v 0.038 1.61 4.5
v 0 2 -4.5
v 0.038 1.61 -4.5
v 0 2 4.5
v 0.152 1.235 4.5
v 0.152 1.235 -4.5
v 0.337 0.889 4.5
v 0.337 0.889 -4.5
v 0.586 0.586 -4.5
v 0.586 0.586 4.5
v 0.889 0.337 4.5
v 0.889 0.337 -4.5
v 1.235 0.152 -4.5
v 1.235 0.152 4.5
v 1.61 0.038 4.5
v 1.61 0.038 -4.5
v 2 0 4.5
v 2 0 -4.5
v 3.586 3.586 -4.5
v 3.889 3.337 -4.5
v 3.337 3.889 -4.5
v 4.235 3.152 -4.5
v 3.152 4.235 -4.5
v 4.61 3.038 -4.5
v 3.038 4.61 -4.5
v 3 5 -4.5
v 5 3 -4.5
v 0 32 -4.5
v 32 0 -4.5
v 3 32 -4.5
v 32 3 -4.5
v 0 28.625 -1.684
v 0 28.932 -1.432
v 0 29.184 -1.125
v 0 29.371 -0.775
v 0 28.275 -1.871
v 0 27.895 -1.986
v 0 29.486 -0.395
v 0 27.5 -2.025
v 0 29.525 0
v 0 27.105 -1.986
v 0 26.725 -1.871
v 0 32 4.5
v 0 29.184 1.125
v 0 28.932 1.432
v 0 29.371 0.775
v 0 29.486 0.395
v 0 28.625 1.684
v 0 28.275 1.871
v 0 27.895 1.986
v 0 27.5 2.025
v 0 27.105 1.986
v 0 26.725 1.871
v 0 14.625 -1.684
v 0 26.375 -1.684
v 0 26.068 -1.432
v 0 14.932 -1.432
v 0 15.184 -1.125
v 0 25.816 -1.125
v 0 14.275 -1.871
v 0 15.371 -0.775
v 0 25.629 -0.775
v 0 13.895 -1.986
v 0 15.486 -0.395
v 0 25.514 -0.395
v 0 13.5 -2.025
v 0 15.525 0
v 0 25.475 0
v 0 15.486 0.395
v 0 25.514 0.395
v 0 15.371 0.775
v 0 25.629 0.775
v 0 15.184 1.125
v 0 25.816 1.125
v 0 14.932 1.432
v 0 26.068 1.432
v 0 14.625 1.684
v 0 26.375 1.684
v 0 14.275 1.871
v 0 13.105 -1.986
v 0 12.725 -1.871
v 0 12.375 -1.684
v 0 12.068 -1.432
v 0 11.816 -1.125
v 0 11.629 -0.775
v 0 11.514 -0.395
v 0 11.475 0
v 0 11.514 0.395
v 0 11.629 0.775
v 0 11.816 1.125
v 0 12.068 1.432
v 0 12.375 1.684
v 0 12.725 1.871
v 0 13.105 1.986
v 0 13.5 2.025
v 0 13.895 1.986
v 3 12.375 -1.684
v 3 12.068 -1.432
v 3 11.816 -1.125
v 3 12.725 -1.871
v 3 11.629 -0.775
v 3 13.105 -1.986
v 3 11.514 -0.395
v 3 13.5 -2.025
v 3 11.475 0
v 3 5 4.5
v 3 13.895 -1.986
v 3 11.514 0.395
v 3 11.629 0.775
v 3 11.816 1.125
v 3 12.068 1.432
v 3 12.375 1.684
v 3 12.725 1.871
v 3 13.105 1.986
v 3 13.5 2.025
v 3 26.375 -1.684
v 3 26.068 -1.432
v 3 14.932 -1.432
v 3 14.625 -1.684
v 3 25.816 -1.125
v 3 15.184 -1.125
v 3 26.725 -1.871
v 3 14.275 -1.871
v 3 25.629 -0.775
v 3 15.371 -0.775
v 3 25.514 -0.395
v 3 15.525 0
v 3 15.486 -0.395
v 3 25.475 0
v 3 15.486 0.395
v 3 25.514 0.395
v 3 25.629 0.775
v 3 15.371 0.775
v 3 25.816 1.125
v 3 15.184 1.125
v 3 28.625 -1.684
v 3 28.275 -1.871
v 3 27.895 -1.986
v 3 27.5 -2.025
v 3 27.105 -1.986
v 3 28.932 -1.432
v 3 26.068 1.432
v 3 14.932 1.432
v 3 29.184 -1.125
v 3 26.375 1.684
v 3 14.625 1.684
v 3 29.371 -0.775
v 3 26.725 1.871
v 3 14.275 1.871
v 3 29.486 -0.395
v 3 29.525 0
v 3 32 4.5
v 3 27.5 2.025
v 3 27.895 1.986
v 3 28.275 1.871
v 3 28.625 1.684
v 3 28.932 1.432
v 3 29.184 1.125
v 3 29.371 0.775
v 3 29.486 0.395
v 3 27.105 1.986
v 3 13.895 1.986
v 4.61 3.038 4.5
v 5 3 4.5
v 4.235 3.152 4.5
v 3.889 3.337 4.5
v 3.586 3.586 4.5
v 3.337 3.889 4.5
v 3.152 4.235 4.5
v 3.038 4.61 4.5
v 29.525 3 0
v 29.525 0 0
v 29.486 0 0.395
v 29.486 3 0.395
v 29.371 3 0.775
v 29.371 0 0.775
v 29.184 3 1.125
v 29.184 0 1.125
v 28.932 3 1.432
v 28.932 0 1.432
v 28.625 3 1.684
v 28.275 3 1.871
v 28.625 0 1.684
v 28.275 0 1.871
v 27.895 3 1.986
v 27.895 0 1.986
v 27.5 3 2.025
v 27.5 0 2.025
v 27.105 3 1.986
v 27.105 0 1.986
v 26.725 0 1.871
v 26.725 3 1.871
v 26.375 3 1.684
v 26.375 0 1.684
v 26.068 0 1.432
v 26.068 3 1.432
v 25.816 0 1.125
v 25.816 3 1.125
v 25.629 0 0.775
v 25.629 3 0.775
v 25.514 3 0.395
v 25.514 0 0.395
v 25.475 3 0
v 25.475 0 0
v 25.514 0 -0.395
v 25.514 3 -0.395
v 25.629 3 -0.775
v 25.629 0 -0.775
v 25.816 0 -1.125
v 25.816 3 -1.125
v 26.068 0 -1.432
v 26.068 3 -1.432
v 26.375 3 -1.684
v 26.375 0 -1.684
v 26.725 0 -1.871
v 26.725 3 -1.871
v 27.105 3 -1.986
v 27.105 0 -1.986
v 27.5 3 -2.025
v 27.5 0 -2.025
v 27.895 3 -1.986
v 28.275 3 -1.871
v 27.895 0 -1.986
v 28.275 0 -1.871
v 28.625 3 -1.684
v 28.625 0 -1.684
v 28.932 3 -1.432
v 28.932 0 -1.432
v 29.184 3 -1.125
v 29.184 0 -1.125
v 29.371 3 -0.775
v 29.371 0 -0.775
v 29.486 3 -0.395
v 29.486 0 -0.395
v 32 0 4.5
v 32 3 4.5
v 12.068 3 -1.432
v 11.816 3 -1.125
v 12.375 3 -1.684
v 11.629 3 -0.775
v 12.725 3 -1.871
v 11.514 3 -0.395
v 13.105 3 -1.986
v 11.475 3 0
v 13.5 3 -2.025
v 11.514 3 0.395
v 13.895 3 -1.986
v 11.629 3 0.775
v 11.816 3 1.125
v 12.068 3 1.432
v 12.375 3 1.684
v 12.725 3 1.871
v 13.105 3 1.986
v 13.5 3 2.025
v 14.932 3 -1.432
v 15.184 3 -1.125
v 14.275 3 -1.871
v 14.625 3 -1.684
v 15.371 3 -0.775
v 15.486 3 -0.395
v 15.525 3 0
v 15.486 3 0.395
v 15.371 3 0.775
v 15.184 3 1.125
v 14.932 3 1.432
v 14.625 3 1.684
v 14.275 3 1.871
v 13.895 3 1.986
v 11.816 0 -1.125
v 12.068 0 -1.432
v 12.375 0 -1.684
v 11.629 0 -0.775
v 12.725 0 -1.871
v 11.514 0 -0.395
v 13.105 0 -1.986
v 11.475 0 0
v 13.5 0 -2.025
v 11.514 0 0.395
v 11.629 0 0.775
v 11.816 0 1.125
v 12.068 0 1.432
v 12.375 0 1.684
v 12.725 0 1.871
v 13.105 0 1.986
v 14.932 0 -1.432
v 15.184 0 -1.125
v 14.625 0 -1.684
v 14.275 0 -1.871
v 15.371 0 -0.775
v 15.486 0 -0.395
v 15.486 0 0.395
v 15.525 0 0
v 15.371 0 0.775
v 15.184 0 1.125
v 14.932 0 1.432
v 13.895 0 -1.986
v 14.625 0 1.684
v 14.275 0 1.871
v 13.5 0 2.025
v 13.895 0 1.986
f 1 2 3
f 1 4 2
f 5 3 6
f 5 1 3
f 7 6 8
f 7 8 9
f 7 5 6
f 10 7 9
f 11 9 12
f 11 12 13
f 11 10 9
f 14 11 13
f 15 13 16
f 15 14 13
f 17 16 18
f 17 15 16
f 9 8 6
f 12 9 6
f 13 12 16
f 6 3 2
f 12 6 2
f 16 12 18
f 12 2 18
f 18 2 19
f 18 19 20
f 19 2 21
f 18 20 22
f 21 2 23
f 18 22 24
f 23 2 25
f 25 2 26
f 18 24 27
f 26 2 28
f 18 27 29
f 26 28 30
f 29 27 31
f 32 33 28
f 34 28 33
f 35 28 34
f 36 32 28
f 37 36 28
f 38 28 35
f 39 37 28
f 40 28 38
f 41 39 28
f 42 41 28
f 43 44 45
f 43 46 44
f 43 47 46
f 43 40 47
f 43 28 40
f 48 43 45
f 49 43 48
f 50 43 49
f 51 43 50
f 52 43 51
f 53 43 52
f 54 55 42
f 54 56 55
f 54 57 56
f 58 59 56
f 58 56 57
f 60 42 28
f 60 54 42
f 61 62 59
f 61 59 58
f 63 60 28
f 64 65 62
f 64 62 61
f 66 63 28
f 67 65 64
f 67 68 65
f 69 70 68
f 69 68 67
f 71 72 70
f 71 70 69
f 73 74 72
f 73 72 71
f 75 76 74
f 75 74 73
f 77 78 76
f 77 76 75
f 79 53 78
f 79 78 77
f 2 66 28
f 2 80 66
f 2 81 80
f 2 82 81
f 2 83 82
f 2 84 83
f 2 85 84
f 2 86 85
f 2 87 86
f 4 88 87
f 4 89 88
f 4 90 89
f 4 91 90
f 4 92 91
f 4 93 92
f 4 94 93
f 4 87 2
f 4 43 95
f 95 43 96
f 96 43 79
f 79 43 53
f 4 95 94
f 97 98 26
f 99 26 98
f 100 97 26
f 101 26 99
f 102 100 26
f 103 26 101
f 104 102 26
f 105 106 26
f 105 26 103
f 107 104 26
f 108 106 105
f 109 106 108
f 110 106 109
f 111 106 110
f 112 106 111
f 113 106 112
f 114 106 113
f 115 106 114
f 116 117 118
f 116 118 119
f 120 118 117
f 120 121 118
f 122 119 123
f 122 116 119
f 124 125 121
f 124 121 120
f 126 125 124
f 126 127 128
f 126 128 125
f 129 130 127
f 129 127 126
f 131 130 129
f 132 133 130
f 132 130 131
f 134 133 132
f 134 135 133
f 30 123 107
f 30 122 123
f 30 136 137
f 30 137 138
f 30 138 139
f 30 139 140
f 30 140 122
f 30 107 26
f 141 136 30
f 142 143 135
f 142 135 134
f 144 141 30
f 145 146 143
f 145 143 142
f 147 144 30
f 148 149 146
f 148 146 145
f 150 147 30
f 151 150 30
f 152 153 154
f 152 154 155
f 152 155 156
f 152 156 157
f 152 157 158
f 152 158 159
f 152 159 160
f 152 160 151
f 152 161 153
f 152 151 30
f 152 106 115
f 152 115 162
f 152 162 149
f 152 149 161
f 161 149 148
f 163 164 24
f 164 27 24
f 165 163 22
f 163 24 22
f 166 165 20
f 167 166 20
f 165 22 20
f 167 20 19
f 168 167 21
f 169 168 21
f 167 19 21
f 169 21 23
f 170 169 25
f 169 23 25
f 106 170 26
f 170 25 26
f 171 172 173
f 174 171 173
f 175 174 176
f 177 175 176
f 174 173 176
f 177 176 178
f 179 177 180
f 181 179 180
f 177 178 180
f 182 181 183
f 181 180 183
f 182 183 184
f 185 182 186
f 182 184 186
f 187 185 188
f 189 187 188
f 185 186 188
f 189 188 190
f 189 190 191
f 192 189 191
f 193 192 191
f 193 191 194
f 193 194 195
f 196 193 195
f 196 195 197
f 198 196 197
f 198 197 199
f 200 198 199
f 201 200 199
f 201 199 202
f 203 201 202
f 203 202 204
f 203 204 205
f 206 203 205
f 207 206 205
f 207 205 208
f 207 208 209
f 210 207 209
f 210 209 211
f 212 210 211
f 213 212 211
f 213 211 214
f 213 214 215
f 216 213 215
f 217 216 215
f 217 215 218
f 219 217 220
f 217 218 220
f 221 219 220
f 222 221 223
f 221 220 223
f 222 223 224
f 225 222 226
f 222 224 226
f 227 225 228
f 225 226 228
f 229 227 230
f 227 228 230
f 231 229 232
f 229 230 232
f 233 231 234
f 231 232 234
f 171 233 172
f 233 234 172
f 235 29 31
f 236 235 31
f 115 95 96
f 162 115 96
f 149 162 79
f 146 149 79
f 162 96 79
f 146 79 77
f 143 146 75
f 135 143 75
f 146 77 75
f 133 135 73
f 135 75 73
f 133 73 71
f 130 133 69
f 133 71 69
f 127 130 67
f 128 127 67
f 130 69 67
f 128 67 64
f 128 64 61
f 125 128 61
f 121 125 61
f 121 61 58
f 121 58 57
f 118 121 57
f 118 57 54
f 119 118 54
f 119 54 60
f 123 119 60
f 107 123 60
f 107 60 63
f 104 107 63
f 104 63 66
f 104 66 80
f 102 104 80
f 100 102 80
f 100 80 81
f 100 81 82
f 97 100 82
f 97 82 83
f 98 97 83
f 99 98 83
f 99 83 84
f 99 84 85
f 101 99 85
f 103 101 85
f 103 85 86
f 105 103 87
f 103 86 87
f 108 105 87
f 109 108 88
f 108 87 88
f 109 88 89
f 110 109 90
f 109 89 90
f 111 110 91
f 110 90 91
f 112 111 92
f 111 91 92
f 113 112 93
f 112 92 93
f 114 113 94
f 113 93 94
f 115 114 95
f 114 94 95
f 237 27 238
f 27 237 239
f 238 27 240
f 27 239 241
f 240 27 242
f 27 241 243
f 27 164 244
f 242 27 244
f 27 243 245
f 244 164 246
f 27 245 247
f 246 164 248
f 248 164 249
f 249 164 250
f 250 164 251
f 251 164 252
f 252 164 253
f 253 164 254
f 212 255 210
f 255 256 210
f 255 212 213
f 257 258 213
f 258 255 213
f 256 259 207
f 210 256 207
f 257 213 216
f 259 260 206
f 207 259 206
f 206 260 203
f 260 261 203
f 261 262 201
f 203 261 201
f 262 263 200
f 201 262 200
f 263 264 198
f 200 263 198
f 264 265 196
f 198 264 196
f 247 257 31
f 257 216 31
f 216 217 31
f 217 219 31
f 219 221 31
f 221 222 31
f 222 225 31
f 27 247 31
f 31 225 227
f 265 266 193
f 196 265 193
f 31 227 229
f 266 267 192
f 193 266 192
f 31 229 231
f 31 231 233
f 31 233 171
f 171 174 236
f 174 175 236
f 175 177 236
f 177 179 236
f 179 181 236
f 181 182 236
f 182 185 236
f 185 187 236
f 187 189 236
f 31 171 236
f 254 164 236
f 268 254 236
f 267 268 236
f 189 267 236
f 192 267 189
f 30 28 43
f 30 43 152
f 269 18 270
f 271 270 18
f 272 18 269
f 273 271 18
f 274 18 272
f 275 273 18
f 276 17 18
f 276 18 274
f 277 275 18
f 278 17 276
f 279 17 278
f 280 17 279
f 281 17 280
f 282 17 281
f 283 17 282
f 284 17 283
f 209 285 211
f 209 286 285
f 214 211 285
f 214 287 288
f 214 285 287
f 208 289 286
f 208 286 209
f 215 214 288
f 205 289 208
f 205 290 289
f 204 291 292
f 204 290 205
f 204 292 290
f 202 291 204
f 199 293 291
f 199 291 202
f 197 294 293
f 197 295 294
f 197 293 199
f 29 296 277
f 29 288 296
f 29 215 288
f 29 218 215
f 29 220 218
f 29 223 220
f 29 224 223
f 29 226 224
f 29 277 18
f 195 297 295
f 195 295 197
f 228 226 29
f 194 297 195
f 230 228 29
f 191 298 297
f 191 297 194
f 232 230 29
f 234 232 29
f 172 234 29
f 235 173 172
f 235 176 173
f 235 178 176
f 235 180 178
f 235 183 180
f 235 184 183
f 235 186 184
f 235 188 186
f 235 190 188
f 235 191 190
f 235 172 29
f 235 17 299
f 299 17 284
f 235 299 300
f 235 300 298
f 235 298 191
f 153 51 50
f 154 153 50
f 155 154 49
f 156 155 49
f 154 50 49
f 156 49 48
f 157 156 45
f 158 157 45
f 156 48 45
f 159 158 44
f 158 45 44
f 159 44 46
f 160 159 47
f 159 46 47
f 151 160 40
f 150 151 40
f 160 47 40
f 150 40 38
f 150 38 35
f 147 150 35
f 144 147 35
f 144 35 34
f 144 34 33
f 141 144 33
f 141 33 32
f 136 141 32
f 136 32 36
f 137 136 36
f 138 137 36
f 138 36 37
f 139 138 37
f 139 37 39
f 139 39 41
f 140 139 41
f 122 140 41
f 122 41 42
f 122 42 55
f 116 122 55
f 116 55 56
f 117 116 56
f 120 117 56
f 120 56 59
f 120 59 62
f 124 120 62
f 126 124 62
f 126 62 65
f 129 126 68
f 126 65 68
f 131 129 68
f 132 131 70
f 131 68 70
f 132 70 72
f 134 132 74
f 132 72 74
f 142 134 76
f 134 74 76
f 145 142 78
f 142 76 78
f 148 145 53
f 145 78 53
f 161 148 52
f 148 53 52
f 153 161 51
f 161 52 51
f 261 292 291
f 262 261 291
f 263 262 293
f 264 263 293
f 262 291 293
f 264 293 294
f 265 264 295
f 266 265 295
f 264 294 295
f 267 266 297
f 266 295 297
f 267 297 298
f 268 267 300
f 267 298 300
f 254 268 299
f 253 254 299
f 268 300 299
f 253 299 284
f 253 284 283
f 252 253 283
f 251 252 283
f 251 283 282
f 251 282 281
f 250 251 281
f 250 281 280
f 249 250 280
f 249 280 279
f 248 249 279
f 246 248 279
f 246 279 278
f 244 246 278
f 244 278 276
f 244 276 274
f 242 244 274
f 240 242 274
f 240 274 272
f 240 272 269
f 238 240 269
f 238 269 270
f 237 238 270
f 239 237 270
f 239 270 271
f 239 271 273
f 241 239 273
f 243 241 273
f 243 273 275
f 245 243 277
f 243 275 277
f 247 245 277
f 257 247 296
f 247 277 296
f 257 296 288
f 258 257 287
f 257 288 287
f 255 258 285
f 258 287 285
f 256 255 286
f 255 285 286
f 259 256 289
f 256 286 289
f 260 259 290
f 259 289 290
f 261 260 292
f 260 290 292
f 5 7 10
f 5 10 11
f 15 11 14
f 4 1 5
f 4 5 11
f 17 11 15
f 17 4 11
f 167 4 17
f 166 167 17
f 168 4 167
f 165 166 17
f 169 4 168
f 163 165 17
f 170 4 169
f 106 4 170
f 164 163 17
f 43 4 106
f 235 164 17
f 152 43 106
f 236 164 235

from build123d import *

# Parameters (mm, degrees)
SKETCH_1_W          = 3
SKETCH_1_H          = 29
SKETCH_1_W_2        = 32
SKETCH_1_H_2        = 3
EXTRUDE_1_DEPTH     = 4.5
SKETCH_3_R          = 2.025
CUT_EXTRUDE_1_DEPTH = 9
SKETCH_4_R          = 2.025
CUT_EXTRUDE_2_DEPTH = 9
FILLET_1_R          = 2


with BuildPart() as part:
    # 草图1 → 凸台-拉伸1 (new body, symmetric)
    with BuildSketch(Plane.XY):
        with Locations((1.5, 17.5)):
            Rectangle(SKETCH_1_W, SKETCH_1_H)
        with Locations((16, 1.5)):
            Rectangle(SKETCH_1_W_2, SKETCH_1_H_2)
    extrude(amount=EXTRUDE_1_DEPTH, both=True)

    # 草图3 → 切除-拉伸1 (cut)
    with BuildSketch(Plane.XZ):
        with Locations((13.5, 0)):
            Circle(SKETCH_3_R)
        with Locations((27.5, 0)):
            Circle(SKETCH_3_R)
    extrude(amount=-CUT_EXTRUDE_1_DEPTH, mode=Mode.SUBTRACT)

    # 草图4 → 切除-拉伸2 (cut)
    with BuildSketch(Plane.ZY):
        with Locations((0, 27.5)):
            Circle(SKETCH_4_R)
        with Locations((0, 13.5)):
            Circle(SKETCH_4_R)
    extrude(amount=-CUT_EXTRUDE_2_DEPTH, mode=Mode.SUBTRACT)

    # 圆角1
    fillet_1_edges = [part.edges().sort_by_distance(p)[0] for p in [
        (3, 3, 0),
        (0, 0, 0),
    ]]
    fillet(fillet_1_edges, radius=FILLET_1_R)


solid = part.part
